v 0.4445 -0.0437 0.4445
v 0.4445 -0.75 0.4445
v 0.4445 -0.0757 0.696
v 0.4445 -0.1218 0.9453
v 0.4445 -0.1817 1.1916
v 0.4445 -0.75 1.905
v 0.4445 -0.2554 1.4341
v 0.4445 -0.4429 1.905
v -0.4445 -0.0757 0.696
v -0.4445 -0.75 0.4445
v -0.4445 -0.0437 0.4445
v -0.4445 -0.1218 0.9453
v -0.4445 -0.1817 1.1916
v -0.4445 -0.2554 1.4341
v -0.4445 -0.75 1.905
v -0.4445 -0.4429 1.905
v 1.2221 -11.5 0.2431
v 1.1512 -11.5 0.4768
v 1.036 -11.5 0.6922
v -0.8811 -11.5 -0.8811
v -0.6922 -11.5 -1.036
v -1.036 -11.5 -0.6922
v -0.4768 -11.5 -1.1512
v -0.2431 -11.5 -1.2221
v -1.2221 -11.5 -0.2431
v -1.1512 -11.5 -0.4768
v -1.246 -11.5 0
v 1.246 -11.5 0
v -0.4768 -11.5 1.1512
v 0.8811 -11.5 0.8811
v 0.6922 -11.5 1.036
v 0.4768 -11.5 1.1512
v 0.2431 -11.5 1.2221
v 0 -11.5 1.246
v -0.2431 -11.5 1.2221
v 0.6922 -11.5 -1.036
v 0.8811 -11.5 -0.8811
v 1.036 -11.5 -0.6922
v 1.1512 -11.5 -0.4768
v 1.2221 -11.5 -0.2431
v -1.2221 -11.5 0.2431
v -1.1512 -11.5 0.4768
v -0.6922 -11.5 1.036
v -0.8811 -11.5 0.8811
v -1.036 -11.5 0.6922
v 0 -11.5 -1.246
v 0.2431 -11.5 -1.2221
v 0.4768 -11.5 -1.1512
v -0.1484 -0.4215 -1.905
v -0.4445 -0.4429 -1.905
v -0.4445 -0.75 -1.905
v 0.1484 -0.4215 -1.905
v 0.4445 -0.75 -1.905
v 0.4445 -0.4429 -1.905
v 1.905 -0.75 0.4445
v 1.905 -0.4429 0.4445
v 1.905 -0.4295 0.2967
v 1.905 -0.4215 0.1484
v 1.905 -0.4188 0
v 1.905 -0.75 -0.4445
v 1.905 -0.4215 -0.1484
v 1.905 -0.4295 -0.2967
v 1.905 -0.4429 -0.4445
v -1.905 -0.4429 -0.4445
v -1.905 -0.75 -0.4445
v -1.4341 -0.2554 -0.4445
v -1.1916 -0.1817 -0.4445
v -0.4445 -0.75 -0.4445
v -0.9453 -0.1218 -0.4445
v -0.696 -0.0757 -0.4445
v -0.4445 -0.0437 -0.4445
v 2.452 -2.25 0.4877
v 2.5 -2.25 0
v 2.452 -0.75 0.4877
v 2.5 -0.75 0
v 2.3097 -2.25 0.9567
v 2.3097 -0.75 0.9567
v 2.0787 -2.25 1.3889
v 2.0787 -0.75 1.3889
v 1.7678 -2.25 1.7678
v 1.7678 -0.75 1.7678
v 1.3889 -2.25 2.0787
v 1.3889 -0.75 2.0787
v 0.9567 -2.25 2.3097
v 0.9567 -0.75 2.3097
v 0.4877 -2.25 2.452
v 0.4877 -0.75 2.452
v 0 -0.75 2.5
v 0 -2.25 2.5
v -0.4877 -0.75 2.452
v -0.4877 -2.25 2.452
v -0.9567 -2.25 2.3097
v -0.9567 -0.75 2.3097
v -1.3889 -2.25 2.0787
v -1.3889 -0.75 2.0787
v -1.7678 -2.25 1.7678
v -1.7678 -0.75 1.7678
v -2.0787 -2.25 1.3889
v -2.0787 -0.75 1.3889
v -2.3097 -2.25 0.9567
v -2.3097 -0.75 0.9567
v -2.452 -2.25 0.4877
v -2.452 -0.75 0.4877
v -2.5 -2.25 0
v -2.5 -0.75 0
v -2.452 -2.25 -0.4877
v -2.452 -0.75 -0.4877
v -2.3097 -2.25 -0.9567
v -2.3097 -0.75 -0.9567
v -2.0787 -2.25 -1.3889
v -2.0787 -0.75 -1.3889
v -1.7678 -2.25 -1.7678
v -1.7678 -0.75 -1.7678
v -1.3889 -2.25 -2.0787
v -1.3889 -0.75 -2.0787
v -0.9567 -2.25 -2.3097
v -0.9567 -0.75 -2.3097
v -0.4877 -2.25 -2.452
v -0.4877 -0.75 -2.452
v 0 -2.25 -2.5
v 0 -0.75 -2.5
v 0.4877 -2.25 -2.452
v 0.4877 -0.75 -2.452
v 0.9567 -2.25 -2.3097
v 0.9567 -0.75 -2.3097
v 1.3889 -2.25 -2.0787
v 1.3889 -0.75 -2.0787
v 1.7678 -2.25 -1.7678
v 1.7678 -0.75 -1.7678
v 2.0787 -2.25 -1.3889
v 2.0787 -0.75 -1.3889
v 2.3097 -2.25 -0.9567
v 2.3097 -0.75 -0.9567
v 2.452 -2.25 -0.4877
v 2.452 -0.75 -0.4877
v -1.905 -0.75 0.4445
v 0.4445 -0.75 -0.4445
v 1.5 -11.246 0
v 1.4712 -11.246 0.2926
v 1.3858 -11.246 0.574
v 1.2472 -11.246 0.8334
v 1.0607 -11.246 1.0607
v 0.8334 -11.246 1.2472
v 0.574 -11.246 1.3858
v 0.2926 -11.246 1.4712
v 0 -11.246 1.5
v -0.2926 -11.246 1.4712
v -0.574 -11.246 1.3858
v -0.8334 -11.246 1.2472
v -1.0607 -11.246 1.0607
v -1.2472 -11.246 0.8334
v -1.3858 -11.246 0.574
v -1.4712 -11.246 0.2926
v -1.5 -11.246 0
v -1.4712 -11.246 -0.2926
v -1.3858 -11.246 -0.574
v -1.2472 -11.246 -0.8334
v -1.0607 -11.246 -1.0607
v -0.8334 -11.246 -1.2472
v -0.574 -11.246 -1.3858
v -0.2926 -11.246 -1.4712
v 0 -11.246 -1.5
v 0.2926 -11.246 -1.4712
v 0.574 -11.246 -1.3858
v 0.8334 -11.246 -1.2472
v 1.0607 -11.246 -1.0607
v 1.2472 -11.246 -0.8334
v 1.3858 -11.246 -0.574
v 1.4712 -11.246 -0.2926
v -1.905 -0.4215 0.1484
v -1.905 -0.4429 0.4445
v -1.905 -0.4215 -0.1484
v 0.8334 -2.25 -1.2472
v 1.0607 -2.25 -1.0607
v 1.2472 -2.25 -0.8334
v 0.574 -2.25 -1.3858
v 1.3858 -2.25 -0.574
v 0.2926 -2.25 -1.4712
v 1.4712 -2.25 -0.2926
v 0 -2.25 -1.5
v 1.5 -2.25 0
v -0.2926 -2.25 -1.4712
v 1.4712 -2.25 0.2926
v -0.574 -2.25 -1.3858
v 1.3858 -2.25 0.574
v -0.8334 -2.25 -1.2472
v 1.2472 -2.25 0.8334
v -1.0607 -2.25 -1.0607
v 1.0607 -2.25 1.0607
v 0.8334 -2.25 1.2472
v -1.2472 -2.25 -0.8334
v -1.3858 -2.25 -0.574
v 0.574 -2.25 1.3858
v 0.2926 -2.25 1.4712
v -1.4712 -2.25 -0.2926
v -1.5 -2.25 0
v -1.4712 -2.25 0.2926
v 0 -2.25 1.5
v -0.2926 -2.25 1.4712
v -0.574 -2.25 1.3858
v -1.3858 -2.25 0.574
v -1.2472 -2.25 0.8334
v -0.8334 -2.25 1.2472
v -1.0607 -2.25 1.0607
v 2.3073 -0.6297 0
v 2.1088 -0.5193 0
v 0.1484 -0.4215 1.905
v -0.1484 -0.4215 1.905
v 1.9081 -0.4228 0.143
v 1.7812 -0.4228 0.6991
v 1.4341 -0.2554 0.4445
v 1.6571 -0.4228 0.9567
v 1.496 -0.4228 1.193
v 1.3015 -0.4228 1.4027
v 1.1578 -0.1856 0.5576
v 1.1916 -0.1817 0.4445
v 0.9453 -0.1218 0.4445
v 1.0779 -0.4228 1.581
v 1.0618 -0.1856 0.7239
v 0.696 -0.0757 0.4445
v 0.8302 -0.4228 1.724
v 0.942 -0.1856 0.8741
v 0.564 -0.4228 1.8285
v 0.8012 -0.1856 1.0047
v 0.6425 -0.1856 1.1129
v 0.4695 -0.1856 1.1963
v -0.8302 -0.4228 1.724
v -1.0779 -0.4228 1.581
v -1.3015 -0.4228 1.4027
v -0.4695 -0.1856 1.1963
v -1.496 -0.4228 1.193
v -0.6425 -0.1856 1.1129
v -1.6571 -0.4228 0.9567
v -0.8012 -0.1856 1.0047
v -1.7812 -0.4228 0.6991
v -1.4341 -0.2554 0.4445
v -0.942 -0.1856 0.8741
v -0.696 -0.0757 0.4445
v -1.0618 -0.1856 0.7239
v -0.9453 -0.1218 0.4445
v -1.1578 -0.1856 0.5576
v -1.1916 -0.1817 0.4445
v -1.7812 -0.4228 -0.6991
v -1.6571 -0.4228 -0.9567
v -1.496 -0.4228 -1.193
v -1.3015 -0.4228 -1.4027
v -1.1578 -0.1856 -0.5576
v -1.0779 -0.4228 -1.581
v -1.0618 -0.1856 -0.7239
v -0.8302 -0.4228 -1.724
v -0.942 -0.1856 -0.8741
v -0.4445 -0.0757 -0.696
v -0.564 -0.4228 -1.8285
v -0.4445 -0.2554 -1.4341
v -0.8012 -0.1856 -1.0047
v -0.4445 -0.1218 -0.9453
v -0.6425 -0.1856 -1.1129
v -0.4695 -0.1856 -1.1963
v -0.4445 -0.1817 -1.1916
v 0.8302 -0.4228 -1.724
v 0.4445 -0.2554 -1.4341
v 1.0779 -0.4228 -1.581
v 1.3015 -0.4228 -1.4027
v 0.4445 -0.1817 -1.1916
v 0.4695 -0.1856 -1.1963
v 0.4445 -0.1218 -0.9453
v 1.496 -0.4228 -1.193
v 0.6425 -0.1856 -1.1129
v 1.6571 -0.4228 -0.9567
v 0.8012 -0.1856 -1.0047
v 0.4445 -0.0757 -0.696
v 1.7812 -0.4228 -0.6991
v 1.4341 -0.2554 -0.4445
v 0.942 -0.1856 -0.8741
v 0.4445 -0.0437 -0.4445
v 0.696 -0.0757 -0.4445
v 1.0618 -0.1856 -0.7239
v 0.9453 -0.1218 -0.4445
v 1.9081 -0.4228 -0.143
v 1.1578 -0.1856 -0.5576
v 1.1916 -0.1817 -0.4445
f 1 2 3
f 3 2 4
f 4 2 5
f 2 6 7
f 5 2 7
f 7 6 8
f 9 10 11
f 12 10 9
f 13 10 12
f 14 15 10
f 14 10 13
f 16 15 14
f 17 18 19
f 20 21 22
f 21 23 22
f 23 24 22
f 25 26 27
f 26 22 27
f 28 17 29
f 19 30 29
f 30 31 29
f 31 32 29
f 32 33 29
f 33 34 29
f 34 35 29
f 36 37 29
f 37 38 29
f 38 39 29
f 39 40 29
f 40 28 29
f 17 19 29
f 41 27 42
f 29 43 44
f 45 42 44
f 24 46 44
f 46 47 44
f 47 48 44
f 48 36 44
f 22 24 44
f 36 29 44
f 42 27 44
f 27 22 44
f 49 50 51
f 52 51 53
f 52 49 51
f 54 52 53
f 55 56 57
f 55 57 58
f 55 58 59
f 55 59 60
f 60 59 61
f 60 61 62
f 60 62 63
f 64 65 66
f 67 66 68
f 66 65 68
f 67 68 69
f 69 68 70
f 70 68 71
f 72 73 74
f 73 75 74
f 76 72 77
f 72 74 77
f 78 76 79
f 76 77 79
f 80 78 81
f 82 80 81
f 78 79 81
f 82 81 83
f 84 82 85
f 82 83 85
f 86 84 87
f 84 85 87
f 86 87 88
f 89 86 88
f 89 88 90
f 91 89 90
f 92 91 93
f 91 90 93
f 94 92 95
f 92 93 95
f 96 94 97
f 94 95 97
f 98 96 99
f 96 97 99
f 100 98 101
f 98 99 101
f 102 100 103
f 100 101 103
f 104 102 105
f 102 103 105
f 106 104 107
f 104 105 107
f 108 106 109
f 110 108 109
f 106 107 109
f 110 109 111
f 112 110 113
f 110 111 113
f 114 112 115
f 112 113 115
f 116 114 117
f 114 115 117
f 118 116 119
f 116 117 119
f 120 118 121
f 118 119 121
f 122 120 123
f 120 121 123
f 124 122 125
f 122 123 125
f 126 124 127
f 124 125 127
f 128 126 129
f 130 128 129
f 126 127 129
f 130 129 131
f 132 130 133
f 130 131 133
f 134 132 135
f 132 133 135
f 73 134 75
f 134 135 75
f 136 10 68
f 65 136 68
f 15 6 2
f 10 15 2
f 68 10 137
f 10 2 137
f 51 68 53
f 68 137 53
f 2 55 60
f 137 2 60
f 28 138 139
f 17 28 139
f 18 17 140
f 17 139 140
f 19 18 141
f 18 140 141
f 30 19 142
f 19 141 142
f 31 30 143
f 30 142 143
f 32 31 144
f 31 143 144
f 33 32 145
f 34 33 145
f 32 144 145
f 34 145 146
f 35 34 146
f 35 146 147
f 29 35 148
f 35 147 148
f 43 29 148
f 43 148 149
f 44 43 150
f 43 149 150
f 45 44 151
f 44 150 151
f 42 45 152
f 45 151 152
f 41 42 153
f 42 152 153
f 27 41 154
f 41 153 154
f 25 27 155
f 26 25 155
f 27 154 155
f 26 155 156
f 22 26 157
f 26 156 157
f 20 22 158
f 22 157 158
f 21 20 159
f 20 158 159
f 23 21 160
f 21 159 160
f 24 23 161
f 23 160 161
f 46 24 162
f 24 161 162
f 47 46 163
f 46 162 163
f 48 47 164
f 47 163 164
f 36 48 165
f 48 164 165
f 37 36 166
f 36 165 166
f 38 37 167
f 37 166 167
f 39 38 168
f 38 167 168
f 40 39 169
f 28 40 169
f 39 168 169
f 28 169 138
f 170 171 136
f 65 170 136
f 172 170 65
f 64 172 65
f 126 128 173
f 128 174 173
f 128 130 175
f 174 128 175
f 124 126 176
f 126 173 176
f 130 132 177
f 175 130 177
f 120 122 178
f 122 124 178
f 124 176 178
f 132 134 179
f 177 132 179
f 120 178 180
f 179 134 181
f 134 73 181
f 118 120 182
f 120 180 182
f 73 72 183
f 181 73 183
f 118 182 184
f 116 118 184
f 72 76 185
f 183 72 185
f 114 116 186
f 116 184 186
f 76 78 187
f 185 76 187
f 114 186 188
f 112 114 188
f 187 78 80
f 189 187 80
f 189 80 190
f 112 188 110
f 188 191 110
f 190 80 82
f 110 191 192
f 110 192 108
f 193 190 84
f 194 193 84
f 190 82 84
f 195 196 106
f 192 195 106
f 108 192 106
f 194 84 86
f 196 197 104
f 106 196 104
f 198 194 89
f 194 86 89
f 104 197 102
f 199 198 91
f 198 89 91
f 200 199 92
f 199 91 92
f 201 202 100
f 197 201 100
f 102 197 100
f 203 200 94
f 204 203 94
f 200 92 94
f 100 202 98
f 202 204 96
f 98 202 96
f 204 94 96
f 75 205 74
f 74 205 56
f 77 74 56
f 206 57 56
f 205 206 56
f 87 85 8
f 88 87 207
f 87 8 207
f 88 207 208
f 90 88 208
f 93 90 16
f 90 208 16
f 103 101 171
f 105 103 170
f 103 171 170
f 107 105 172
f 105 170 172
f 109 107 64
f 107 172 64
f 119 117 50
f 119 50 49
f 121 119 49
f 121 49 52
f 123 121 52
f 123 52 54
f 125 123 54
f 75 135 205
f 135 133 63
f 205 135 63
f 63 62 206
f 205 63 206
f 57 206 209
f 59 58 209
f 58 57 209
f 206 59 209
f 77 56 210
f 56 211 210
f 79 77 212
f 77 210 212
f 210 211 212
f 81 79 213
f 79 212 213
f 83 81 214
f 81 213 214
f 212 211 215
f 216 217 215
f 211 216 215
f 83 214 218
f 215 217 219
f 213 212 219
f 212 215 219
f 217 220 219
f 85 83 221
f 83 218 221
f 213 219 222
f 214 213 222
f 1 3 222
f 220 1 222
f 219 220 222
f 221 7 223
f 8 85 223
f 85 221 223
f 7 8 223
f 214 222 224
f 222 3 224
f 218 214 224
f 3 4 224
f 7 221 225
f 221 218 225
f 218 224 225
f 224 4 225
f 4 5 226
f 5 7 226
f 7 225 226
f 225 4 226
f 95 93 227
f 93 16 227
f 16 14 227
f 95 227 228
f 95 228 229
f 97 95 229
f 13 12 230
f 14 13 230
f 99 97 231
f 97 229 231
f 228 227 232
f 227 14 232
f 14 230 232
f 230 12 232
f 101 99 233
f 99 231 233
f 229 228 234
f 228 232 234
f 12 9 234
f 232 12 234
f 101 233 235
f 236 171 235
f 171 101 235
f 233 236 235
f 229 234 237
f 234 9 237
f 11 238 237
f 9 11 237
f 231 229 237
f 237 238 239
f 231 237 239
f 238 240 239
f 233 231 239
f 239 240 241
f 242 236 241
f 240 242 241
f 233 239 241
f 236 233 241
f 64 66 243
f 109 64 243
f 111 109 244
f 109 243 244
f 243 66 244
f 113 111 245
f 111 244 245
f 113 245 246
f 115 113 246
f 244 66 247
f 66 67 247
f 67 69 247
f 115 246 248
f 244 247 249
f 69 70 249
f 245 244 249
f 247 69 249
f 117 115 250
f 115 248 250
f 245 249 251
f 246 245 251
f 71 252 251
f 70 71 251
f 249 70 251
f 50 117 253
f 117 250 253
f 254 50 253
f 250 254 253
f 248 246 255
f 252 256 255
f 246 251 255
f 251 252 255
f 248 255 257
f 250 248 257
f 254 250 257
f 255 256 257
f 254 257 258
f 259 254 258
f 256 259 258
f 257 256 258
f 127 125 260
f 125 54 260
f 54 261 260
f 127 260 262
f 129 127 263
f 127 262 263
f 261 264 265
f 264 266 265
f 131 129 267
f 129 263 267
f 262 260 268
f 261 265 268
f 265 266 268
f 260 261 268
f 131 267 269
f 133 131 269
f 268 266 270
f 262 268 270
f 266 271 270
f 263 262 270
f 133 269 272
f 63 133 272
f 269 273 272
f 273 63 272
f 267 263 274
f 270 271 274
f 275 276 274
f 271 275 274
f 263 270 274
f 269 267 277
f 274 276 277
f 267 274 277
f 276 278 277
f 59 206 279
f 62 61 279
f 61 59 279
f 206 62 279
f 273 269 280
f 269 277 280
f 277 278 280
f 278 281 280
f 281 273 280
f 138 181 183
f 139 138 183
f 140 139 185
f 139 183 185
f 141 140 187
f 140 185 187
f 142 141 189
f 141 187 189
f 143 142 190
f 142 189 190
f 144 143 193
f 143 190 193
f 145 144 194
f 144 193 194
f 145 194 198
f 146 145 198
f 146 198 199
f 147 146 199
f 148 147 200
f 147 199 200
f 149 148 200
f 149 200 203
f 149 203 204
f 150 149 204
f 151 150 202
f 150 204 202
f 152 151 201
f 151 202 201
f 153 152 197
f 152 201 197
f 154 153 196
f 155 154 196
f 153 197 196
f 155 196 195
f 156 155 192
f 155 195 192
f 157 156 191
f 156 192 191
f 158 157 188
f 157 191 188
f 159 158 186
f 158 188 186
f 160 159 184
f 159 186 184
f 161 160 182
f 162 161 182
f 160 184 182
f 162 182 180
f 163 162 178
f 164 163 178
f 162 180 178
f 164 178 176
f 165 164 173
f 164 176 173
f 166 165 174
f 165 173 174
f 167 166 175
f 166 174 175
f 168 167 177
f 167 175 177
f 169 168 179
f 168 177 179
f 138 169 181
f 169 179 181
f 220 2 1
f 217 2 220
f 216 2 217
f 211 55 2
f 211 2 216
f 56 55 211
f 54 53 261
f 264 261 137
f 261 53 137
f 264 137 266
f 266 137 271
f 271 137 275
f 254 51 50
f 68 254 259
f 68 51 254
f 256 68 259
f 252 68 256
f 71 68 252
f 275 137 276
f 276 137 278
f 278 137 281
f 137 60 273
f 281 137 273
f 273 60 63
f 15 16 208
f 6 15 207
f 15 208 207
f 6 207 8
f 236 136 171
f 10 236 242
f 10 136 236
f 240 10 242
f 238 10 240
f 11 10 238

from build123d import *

# Parameters (mm, degrees)
SKETCH2_W      = 0.889
SKETCH2_H      = 1.64826619
EXTRUDE1_DEPTH = 1.905
SKETCH3_W      = 0.889
SKETCH3_H      = 2.39619966
EXTRUDE2_DEPTH = 1.905
CHAMFER1_SIZE  = 0.254


with BuildPart() as part:
    # Sketch1 → Revolve1 (revolve)
    with BuildSketch(Plane.XY):
        with BuildLine():
            Line((0, 0), (0, -11.5))
            Line((0, -11.5), (1.5, -11.5))
            Line((1.5, -11.5), (1.5, -2.25))
            Line((1.5, -2.25), (2.5, -2.25))
            Line((2.5, -2.25), (2.5, -0.75))
            ThreePointArc((2.5, -0.75), (1.305038314, -0.191538955), (0, 0))
        make_face()
    revolve(axis=Axis((0, 0, 0), (0, -1, 0)))

    # Sketch2 → Extrude1 (cut, symmetric)
    with BuildSketch(Plane.XY):
        with Locations((0, 0.074133095)):
            Rectangle(SKETCH2_W, SKETCH2_H)
    extrude(amount=EXTRUDE1_DEPTH, both=True, mode=Mode.SUBTRACT)

    # Sketch3 → Extrude2 (cut, symmetric)
    with BuildSketch(Plane(origin=(0, 0, 0), x_dir=(0, 0, -1), z_dir=(1, 0, 0))):
        with Locations((0, 0.44809983)):
            Rectangle(SKETCH3_W, SKETCH3_H)
    extrude(amount=EXTRUDE2_DEPTH, both=True, mode=Mode.SUBTRACT)

    # Chamfer1
    chamfer1_edges = [part.edges().sort_by_distance(p)[0] for p in [
        (-1.5, -11.5, 0),
    ]]
    chamfer(chamfer1_edges, length=CHAMFER1_SIZE)


solid = part.part
